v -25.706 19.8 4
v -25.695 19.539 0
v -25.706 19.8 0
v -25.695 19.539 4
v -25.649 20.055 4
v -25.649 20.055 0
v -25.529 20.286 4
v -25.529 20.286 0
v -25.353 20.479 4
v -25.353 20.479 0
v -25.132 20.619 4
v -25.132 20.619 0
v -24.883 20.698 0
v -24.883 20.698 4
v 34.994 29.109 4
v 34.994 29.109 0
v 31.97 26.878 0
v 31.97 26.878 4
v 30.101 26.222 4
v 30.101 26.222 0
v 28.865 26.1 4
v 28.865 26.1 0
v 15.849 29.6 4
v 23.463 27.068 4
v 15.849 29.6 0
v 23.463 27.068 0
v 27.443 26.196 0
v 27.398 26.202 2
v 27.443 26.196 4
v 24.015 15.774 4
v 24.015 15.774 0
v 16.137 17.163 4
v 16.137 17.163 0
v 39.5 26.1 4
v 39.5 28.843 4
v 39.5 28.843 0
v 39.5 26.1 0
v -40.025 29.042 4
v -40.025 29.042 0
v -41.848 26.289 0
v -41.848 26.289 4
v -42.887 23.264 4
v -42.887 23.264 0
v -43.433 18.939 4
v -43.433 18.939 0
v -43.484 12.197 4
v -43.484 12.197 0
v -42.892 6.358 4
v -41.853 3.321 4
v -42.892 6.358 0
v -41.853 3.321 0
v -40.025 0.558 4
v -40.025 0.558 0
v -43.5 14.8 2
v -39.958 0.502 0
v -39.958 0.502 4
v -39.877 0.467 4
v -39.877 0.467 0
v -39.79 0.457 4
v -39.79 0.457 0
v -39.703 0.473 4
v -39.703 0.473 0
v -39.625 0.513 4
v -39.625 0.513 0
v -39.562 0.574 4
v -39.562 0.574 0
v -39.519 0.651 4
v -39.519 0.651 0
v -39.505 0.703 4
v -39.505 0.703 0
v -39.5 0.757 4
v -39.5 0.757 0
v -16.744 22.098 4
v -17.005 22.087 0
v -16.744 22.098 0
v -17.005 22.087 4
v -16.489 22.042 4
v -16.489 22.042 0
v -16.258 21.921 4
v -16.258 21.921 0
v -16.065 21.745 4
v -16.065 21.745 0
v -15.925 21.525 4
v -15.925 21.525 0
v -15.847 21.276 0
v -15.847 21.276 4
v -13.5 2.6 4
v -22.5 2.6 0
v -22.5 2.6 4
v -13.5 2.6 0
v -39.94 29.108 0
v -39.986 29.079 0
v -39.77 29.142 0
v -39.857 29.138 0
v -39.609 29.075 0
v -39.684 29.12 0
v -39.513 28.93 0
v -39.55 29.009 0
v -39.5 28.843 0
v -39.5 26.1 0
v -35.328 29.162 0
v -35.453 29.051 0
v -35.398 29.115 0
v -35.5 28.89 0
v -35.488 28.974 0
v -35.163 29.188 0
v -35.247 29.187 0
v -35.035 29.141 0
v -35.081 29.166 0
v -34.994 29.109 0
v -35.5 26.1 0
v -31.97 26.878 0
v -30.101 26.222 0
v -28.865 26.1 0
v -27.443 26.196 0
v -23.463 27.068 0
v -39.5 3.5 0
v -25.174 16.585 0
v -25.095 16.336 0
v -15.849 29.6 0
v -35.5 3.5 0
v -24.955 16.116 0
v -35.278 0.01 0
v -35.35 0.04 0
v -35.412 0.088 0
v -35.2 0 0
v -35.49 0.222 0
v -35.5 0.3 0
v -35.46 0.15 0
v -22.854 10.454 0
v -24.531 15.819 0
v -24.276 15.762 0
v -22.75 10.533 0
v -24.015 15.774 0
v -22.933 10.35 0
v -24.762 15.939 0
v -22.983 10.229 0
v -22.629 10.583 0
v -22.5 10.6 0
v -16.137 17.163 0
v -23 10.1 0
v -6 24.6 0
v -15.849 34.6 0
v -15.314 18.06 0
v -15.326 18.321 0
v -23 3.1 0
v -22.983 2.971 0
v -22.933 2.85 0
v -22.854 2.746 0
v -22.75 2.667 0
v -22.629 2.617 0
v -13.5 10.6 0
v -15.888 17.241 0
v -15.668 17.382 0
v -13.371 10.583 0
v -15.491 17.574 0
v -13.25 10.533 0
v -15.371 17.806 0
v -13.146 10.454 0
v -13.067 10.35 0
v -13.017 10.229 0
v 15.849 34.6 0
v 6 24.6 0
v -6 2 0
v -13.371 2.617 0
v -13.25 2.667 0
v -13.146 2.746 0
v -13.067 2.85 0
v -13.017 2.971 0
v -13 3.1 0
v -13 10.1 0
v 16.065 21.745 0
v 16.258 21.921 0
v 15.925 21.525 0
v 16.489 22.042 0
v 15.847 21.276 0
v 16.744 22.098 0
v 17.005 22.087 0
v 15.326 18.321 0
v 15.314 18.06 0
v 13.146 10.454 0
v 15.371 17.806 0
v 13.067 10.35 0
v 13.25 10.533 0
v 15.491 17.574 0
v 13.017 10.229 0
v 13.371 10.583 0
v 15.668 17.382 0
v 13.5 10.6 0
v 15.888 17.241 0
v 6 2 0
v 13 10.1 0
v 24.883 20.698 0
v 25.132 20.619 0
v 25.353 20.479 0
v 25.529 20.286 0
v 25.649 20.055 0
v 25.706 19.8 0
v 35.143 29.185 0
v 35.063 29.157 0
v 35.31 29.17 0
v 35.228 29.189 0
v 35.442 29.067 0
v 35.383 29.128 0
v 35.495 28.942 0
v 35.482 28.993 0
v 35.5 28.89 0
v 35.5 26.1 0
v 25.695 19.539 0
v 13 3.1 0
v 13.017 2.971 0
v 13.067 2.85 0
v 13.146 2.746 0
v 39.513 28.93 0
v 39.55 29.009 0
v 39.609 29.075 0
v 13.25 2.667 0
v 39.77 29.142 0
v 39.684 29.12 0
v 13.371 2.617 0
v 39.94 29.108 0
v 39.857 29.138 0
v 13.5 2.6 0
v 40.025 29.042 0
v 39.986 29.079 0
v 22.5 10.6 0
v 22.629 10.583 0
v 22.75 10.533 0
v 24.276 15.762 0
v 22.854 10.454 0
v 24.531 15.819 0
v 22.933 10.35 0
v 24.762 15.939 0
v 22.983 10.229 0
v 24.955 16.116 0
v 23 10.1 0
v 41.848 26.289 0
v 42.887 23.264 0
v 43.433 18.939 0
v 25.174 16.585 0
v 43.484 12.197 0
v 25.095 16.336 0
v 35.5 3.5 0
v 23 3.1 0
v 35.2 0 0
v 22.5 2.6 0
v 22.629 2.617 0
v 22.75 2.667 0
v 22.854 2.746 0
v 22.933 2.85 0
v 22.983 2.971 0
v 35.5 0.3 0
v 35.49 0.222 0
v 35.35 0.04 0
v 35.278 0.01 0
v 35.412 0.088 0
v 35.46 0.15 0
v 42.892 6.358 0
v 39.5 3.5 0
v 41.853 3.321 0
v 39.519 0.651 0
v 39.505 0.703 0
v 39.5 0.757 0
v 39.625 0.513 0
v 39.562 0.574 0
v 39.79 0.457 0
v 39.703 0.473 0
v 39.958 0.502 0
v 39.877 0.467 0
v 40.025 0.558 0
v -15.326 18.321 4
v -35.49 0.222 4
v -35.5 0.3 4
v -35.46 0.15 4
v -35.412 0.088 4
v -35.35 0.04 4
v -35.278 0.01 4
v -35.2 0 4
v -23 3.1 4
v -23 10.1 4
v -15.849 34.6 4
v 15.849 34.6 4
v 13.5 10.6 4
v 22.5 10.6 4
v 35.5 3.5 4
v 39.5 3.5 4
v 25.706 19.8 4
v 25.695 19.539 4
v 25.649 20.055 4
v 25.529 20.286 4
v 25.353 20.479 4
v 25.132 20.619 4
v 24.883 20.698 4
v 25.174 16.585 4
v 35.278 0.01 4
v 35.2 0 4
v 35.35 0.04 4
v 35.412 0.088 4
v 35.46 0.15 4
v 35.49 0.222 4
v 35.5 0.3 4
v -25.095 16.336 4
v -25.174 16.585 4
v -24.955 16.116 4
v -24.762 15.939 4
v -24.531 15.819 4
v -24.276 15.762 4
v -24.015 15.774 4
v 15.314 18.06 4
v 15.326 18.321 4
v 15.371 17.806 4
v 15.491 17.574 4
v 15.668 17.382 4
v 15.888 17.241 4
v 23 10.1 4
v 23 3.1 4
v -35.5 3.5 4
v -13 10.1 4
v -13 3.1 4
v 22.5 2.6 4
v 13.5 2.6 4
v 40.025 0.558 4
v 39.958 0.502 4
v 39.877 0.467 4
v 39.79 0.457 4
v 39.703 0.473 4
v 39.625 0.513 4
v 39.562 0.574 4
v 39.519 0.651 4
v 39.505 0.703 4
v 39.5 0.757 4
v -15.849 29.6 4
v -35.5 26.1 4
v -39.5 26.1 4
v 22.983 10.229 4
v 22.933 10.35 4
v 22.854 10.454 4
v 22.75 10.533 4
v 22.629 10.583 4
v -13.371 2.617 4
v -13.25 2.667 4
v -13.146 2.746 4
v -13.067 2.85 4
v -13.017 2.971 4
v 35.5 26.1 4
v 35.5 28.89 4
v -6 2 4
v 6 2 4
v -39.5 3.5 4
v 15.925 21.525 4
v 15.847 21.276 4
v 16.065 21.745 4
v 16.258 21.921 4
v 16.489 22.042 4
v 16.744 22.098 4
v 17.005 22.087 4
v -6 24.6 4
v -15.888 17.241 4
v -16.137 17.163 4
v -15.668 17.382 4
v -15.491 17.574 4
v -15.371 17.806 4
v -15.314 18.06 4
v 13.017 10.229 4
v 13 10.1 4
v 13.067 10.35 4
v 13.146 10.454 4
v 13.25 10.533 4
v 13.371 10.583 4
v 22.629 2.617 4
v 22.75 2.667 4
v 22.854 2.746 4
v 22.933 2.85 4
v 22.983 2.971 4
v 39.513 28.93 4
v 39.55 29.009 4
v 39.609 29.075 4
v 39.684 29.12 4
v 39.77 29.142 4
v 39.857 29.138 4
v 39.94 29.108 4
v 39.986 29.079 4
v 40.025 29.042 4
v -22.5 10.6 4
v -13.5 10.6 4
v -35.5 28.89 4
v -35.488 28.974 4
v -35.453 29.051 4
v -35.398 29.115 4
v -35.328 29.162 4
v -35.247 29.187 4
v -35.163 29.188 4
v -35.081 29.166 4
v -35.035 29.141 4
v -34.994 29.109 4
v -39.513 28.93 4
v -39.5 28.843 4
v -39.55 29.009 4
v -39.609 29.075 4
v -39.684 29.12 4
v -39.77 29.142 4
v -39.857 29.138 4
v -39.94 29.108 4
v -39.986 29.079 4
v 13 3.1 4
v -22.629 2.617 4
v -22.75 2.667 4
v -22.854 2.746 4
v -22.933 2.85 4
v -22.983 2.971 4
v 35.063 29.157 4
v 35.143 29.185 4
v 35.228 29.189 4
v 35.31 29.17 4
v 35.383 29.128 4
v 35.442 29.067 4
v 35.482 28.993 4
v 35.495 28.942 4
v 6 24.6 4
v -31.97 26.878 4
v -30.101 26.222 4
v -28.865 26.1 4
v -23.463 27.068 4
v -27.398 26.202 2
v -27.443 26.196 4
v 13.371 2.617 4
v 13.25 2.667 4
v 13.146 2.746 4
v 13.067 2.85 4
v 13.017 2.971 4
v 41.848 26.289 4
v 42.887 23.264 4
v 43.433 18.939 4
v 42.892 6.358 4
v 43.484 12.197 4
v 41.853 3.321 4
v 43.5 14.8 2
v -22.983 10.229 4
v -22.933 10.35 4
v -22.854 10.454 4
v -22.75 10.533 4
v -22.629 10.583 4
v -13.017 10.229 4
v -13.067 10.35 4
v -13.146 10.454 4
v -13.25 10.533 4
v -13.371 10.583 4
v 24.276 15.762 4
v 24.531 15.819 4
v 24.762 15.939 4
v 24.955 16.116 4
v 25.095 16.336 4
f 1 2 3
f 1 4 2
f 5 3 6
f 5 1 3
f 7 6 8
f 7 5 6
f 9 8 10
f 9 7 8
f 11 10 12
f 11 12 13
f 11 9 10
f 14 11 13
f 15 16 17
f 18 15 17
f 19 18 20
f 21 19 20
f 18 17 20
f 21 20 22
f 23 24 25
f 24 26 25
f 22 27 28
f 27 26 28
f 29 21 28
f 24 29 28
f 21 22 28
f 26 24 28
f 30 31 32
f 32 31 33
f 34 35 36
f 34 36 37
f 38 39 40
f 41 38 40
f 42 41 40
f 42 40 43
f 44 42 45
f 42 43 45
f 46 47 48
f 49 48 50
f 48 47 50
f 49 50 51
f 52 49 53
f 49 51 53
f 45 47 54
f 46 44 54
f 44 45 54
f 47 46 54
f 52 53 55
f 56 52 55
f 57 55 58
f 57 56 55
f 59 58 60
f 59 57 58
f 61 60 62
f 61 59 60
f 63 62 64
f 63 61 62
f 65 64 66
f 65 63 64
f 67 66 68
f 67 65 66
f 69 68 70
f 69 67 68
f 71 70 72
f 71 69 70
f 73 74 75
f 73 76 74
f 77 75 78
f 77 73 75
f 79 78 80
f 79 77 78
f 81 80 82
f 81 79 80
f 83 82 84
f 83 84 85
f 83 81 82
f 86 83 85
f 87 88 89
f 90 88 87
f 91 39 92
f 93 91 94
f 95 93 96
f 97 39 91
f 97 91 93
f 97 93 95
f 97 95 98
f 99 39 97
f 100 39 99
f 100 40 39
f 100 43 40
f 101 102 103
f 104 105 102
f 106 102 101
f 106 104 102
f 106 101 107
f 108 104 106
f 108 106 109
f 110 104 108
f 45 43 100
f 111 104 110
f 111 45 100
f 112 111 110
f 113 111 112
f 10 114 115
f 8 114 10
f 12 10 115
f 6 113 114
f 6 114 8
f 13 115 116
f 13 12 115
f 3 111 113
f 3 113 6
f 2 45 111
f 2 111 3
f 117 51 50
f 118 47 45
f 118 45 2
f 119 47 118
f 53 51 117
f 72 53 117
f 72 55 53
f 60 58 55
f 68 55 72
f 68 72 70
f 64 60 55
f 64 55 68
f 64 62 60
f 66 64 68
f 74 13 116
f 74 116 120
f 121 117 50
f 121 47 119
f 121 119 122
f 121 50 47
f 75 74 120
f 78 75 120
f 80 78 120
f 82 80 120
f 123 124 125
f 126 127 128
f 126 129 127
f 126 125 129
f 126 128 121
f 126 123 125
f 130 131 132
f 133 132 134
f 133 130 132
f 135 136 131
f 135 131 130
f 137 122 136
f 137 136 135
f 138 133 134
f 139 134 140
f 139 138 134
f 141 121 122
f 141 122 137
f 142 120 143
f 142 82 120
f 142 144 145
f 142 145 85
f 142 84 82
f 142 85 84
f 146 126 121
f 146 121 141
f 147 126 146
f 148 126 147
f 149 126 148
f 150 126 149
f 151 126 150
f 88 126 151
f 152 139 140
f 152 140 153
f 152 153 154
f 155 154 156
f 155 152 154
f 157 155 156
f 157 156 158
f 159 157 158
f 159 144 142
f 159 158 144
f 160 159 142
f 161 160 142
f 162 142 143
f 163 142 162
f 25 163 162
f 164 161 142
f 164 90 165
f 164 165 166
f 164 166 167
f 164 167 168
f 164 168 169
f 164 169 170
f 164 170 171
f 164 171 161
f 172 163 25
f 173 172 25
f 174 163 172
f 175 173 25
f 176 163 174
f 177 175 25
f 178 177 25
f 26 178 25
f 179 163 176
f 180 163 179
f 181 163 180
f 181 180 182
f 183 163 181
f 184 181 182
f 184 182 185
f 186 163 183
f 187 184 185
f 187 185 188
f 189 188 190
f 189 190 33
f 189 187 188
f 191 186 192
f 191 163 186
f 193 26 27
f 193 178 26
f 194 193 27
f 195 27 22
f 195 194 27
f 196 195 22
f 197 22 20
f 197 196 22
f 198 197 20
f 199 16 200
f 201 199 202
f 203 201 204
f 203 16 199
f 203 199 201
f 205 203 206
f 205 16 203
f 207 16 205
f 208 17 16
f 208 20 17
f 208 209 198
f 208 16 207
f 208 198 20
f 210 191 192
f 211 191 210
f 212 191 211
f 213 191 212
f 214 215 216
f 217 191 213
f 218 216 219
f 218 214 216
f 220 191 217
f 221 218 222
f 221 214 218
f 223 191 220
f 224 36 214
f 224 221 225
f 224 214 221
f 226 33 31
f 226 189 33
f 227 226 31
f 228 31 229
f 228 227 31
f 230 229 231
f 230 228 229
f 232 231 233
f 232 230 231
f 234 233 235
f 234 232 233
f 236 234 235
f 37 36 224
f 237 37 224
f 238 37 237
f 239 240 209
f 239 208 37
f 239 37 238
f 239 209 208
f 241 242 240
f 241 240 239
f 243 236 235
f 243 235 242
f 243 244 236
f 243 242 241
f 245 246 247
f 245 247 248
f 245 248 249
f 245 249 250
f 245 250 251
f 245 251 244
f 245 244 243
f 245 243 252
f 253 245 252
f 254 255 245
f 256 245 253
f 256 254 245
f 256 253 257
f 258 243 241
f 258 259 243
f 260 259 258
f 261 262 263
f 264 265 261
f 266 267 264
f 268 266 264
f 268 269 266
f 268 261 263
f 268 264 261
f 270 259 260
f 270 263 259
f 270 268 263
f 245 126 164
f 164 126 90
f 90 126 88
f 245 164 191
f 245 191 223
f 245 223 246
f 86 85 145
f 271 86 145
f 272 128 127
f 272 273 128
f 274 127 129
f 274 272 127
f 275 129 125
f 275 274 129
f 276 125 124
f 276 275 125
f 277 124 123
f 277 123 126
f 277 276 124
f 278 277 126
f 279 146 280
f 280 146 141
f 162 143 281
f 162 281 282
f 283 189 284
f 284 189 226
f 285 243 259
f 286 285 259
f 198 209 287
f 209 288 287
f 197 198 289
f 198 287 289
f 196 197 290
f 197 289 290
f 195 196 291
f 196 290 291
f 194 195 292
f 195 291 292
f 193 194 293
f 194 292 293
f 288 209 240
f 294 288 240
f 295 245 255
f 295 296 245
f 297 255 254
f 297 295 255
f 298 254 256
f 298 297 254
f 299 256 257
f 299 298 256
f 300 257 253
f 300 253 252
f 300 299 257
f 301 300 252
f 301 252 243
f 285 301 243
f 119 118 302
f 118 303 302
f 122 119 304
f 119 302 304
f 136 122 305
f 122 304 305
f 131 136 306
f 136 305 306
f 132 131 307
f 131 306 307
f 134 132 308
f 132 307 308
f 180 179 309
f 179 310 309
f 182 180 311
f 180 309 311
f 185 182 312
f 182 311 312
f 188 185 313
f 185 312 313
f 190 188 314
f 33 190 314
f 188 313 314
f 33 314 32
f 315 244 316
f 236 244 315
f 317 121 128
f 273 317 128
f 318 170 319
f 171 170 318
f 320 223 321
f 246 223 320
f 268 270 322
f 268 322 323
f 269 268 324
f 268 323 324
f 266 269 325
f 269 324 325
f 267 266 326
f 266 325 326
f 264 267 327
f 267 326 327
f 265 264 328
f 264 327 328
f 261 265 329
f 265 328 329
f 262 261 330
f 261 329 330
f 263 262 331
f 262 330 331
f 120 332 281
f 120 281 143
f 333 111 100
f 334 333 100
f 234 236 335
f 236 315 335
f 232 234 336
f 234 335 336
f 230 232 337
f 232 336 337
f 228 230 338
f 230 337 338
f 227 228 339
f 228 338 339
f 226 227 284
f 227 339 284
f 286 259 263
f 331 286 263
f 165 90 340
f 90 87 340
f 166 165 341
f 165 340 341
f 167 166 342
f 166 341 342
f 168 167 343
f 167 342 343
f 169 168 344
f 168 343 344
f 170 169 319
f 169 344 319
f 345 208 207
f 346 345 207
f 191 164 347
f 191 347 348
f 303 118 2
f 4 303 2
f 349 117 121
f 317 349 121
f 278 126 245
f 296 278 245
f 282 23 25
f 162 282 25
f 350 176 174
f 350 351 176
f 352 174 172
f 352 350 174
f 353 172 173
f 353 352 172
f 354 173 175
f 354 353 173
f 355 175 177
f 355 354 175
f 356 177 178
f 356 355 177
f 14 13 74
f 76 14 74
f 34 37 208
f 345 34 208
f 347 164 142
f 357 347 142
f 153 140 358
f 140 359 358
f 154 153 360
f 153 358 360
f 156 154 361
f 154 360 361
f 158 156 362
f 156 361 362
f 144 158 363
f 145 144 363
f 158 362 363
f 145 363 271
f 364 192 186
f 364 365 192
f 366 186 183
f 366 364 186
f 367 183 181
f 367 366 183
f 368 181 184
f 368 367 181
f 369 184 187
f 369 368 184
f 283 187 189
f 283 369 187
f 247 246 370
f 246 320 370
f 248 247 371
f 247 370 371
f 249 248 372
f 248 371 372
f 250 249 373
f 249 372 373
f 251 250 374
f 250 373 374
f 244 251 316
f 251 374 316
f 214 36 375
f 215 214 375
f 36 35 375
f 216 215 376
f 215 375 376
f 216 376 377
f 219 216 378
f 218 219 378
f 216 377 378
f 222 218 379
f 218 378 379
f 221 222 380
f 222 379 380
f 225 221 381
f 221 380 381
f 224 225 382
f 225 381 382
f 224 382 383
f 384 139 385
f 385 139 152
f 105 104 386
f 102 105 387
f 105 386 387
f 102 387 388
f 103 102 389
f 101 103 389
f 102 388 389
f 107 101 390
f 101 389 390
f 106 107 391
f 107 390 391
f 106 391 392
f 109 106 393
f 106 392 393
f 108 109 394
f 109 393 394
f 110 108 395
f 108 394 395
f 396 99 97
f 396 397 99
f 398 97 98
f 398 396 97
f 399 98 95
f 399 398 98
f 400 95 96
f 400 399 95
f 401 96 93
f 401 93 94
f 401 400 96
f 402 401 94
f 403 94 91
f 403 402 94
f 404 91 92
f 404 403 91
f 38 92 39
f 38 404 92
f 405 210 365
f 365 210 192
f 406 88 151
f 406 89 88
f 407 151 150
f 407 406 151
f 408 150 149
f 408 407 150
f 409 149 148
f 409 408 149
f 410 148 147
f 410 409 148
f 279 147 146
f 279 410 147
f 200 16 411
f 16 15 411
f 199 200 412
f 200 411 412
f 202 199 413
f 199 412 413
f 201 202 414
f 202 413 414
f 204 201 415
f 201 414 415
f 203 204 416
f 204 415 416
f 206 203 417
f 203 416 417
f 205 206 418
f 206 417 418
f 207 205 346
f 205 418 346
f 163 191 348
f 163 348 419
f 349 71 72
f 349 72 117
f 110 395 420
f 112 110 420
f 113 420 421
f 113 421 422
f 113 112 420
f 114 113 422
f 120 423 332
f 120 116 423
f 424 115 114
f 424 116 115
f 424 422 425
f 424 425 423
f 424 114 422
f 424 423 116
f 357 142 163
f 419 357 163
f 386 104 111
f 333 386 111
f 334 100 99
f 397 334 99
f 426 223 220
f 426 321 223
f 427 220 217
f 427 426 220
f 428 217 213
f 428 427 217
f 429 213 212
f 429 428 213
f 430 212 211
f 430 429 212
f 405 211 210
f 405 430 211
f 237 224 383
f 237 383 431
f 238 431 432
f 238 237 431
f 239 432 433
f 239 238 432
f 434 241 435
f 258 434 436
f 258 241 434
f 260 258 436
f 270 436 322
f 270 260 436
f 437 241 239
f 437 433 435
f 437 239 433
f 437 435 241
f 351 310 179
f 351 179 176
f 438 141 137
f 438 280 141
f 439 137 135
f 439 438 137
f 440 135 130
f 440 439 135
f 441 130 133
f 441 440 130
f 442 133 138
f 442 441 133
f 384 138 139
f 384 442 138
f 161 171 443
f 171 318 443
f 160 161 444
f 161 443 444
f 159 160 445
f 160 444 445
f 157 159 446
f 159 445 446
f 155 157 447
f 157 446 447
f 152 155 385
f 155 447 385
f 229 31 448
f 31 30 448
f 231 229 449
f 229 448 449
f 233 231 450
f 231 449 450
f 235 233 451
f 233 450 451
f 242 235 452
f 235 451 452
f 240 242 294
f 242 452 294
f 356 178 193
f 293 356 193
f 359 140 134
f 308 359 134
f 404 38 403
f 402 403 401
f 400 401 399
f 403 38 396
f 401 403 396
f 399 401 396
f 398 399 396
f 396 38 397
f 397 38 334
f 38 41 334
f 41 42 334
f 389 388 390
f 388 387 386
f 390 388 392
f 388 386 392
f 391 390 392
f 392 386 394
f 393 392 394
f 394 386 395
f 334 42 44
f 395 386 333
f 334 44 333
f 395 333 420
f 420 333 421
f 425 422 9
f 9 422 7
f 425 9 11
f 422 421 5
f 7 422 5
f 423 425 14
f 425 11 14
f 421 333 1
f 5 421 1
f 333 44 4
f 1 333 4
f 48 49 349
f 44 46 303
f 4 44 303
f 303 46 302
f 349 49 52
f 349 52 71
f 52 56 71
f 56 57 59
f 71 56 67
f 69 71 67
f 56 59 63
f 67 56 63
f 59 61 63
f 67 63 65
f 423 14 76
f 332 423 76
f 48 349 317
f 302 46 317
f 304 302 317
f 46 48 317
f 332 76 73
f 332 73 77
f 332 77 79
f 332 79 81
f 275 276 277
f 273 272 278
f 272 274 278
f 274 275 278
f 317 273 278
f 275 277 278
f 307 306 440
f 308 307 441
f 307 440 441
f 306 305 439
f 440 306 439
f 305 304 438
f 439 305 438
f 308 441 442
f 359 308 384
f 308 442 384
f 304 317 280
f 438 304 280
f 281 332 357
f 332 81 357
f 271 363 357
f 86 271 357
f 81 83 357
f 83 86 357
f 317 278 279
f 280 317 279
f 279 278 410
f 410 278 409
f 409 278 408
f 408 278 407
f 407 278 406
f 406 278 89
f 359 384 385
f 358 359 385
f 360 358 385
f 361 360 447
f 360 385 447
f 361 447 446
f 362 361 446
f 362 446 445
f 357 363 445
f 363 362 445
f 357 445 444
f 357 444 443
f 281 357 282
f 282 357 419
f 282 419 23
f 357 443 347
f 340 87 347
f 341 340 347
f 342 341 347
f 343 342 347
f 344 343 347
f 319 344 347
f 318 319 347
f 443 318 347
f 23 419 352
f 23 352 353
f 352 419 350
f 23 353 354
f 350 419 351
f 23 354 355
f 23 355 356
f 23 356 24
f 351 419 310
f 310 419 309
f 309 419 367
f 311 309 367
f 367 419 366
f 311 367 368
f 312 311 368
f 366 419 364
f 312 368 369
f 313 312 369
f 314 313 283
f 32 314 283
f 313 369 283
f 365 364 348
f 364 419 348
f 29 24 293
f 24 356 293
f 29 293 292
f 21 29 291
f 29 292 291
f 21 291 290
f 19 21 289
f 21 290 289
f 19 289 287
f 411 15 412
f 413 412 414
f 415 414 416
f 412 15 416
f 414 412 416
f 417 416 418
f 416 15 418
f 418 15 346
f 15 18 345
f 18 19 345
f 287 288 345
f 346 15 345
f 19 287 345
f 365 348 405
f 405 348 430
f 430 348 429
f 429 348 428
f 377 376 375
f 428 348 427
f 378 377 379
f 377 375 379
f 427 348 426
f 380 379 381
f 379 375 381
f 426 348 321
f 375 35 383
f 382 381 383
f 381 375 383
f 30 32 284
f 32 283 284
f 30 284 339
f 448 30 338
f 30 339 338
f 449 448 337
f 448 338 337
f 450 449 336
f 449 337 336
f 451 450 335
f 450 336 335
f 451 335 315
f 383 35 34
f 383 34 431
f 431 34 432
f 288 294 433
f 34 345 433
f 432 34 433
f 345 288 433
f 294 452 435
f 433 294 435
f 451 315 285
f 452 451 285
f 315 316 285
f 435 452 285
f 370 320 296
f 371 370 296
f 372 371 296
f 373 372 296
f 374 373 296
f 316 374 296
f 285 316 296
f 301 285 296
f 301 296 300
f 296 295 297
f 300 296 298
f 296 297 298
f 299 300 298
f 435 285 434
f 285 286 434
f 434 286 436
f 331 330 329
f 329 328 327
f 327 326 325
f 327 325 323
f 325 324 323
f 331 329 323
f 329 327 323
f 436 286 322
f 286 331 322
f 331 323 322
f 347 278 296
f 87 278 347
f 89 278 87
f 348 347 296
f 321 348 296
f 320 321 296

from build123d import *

# Parameters (mm, degrees)
ESTRUSIONE_ESTRUSIONE1_OUTLINE_W   = 10
ESTRUSIONE_ESTRUSIONE1_OUTLINE_H   = 8
ESTRUSIONE_ESTRUSIONE1_OUTLINE_W_2 = 12
ESTRUSIONE_ESTRUSIONE1_OUTLINE_H_2 = 22.6
ESTRUSIONE_ESTRUSIONE1_DEPTH       = 4
RACCORDO1_R                        = 1
RACCORDO3_R                        = 0.5
RACCORDO4_R                        = 0.3
SCHIZZO3_W                         = 31.69719665
SCHIZZO3_H                         = 4
ESTRUSIONE_ESTRUSIONE2_DEPTH       = 5


# Read off the part's stored shape, not the designer's step: Estrusione-Estrusione1
with BuildPart() as part:
    # Estrusione-Estrusione1 outline → Estrusione-Estrusione1 (new body)
    with BuildSketch(Plane.XY):
        with BuildLine():
            Line((-35.5, 26.1), (-39.5, 26.1))
            Line((-39.5, 26.1), (-39.5, 29.6))
            add(Edge.make_bspline(
                [(-39.5, 29.6), (-43.506938427, 25.593061573), (-43.493061573, 14.8), (-43.506938427, 4.006938427), (-39.5, 0)],
                knots=[0, 0, 0, 0, 0.5, 1, 1, 1, 1], degree=3))
            Line((-39.5, 0), (-39.5, 3.5))
            Line((-39.5, 3.5), (-35.5, 3.5))
            Line((-35.5, 3.5), (-35.5, 0))
            Line((-35.5, 0), (35.5, 0))
            Line((35.5, 0), (35.5, 3.5))
            Line((35.5, 3.5), (39.5, 3.5))
            Line((39.5, 3.5), (39.5, 0))
            add(Edge.make_bspline(
                [(39.5, 29.6), (43.506938427, 25.593061573), (43.493061573, 14.8), (43.506938427, 4.006938427), (39.5, 0)],
                knots=[0, 0, 0, 0, 0.5, 1, 1, 1, 1], degree=3))
            Line((39.5, 29.6), (39.5, 26.1))
            Line((39.5, 26.1), (35.5, 26.1))
            Line((35.5, 26.1), (35.5, 29.6))
            add(Edge.make_bspline(
                [(35.5, 29.6), (31.962623794, 26.062612753), (26.4060962, 25.659880805), (20.342579531, 28.112334068), (15.848598331, 29.600000017)],
                knots=[0, 0, 0, 0, 0.358970883, 0.890087037, 0.890087037, 0.890087037, 0.890087037], degree=3))
            Line((15.848598331, 29.600000017), (-15.848598331, 29.600000017))
            add(Edge.make_bspline(
                [(-35.5, 29.6), (-31.962623794, 26.062612753), (-26.4060962, 25.659880805), (-20.342579531, 28.112334068), (-15.848598331, 29.600000017)],
                knots=[0, 0, 0, 0, 0.358970883, 0.890087037, 0.890087037, 0.890087037, 0.890087037], degree=3))
            Line((-35.5, 29.6), (-35.5, 26.1))
        make_face()
        with Locations((-18, 6.6)):
            Rectangle(ESTRUSIONE_ESTRUSIONE1_OUTLINE_W, ESTRUSIONE_ESTRUSIONE1_OUTLINE_H, mode=Mode.SUBTRACT)
        with Locations((18, 6.6)):
            Rectangle(ESTRUSIONE_ESTRUSIONE1_OUTLINE_W, ESTRUSIONE_ESTRUSIONE1_OUTLINE_H, mode=Mode.SUBTRACT)
        with Locations((0, 13.3)):
            Rectangle(ESTRUSIONE_ESTRUSIONE1_OUTLINE_W_2, ESTRUSIONE_ESTRUSIONE1_OUTLINE_H_2, mode=Mode.SUBTRACT)
        Polygon((-25.868240888, 20.524038765), (-16.020163358, 22.260520542), (-15.15192247, 17.336481777), (-25, 15.6), align=None, mode=Mode.SUBTRACT)
        Polygon((16.020163358, 22.260520542), (25.868240888, 20.524038765), (25, 15.6), (15.15192247, 17.336481777), align=None, mode=Mode.SUBTRACT)
    extrude(amount=ESTRUSIONE_ESTRUSIONE1_DEPTH)

    # Raccordo1
    raccordo1_edges = [part.edges().sort_by_distance(p)[0] for p in [
        (16.020163358, 22.260520542, 2),
        (15.15192247, 17.336481777, 2),
        (25, 15.6, 2),
        (25.868240888, 20.524038765, 2),
        (-25.868240888, 20.524038765, 2),
        (-25, 15.6, 2),
        (-15.15192247, 17.336481777, 2),
        (-16.020163358, 22.260520542, 2),
    ]]
    fillet(raccordo1_edges, radius=RACCORDO1_R)

    # Raccordo3
    raccordo3_edges = [part.edges().sort_by_distance(p)[0] for p in [
        (13, 10.6, 2),
        (13, 2.6, 2),
        (23, 2.6, 2),
        (23, 10.6, 2),
        (-23, 10.6, 2),
        (-23, 2.6, 2),
        (-13, 2.6, 2),
        (-13, 10.6, 2),
    ]]
    fillet(raccordo3_edges, radius=RACCORDO3_R)

    # Raccordo4
    raccordo4_edges = [part.edges().sort_by_distance(p)[0] for p in [
        (-39.5, 0, 2),
        (39.5, 0, 2),
        (39.5, 29.6, 2),
        (35.5, 29.6, 2),
        (-39.5, 29.6, 2),
        (-35.5, 29.6, 2),
        (35.5, 0, 2),
        (-35.5, 0, 2),
    ]]
    fillet(raccordo4_edges, radius=RACCORDO4_R)

    # Schizzo3 → Estrusione-Estrusione2 (add)
    with BuildSketch(Plane(origin=(0, 29.6, 0), x_dir=(1, 0, 0), z_dir=(0, 1, 0))):
        with Locations((0, -2)):
            Rectangle(SCHIZZO3_W, SCHIZZO3_H)
    extrude(amount=ESTRUSIONE_ESTRUSIONE2_DEPTH)


solid = part.part
